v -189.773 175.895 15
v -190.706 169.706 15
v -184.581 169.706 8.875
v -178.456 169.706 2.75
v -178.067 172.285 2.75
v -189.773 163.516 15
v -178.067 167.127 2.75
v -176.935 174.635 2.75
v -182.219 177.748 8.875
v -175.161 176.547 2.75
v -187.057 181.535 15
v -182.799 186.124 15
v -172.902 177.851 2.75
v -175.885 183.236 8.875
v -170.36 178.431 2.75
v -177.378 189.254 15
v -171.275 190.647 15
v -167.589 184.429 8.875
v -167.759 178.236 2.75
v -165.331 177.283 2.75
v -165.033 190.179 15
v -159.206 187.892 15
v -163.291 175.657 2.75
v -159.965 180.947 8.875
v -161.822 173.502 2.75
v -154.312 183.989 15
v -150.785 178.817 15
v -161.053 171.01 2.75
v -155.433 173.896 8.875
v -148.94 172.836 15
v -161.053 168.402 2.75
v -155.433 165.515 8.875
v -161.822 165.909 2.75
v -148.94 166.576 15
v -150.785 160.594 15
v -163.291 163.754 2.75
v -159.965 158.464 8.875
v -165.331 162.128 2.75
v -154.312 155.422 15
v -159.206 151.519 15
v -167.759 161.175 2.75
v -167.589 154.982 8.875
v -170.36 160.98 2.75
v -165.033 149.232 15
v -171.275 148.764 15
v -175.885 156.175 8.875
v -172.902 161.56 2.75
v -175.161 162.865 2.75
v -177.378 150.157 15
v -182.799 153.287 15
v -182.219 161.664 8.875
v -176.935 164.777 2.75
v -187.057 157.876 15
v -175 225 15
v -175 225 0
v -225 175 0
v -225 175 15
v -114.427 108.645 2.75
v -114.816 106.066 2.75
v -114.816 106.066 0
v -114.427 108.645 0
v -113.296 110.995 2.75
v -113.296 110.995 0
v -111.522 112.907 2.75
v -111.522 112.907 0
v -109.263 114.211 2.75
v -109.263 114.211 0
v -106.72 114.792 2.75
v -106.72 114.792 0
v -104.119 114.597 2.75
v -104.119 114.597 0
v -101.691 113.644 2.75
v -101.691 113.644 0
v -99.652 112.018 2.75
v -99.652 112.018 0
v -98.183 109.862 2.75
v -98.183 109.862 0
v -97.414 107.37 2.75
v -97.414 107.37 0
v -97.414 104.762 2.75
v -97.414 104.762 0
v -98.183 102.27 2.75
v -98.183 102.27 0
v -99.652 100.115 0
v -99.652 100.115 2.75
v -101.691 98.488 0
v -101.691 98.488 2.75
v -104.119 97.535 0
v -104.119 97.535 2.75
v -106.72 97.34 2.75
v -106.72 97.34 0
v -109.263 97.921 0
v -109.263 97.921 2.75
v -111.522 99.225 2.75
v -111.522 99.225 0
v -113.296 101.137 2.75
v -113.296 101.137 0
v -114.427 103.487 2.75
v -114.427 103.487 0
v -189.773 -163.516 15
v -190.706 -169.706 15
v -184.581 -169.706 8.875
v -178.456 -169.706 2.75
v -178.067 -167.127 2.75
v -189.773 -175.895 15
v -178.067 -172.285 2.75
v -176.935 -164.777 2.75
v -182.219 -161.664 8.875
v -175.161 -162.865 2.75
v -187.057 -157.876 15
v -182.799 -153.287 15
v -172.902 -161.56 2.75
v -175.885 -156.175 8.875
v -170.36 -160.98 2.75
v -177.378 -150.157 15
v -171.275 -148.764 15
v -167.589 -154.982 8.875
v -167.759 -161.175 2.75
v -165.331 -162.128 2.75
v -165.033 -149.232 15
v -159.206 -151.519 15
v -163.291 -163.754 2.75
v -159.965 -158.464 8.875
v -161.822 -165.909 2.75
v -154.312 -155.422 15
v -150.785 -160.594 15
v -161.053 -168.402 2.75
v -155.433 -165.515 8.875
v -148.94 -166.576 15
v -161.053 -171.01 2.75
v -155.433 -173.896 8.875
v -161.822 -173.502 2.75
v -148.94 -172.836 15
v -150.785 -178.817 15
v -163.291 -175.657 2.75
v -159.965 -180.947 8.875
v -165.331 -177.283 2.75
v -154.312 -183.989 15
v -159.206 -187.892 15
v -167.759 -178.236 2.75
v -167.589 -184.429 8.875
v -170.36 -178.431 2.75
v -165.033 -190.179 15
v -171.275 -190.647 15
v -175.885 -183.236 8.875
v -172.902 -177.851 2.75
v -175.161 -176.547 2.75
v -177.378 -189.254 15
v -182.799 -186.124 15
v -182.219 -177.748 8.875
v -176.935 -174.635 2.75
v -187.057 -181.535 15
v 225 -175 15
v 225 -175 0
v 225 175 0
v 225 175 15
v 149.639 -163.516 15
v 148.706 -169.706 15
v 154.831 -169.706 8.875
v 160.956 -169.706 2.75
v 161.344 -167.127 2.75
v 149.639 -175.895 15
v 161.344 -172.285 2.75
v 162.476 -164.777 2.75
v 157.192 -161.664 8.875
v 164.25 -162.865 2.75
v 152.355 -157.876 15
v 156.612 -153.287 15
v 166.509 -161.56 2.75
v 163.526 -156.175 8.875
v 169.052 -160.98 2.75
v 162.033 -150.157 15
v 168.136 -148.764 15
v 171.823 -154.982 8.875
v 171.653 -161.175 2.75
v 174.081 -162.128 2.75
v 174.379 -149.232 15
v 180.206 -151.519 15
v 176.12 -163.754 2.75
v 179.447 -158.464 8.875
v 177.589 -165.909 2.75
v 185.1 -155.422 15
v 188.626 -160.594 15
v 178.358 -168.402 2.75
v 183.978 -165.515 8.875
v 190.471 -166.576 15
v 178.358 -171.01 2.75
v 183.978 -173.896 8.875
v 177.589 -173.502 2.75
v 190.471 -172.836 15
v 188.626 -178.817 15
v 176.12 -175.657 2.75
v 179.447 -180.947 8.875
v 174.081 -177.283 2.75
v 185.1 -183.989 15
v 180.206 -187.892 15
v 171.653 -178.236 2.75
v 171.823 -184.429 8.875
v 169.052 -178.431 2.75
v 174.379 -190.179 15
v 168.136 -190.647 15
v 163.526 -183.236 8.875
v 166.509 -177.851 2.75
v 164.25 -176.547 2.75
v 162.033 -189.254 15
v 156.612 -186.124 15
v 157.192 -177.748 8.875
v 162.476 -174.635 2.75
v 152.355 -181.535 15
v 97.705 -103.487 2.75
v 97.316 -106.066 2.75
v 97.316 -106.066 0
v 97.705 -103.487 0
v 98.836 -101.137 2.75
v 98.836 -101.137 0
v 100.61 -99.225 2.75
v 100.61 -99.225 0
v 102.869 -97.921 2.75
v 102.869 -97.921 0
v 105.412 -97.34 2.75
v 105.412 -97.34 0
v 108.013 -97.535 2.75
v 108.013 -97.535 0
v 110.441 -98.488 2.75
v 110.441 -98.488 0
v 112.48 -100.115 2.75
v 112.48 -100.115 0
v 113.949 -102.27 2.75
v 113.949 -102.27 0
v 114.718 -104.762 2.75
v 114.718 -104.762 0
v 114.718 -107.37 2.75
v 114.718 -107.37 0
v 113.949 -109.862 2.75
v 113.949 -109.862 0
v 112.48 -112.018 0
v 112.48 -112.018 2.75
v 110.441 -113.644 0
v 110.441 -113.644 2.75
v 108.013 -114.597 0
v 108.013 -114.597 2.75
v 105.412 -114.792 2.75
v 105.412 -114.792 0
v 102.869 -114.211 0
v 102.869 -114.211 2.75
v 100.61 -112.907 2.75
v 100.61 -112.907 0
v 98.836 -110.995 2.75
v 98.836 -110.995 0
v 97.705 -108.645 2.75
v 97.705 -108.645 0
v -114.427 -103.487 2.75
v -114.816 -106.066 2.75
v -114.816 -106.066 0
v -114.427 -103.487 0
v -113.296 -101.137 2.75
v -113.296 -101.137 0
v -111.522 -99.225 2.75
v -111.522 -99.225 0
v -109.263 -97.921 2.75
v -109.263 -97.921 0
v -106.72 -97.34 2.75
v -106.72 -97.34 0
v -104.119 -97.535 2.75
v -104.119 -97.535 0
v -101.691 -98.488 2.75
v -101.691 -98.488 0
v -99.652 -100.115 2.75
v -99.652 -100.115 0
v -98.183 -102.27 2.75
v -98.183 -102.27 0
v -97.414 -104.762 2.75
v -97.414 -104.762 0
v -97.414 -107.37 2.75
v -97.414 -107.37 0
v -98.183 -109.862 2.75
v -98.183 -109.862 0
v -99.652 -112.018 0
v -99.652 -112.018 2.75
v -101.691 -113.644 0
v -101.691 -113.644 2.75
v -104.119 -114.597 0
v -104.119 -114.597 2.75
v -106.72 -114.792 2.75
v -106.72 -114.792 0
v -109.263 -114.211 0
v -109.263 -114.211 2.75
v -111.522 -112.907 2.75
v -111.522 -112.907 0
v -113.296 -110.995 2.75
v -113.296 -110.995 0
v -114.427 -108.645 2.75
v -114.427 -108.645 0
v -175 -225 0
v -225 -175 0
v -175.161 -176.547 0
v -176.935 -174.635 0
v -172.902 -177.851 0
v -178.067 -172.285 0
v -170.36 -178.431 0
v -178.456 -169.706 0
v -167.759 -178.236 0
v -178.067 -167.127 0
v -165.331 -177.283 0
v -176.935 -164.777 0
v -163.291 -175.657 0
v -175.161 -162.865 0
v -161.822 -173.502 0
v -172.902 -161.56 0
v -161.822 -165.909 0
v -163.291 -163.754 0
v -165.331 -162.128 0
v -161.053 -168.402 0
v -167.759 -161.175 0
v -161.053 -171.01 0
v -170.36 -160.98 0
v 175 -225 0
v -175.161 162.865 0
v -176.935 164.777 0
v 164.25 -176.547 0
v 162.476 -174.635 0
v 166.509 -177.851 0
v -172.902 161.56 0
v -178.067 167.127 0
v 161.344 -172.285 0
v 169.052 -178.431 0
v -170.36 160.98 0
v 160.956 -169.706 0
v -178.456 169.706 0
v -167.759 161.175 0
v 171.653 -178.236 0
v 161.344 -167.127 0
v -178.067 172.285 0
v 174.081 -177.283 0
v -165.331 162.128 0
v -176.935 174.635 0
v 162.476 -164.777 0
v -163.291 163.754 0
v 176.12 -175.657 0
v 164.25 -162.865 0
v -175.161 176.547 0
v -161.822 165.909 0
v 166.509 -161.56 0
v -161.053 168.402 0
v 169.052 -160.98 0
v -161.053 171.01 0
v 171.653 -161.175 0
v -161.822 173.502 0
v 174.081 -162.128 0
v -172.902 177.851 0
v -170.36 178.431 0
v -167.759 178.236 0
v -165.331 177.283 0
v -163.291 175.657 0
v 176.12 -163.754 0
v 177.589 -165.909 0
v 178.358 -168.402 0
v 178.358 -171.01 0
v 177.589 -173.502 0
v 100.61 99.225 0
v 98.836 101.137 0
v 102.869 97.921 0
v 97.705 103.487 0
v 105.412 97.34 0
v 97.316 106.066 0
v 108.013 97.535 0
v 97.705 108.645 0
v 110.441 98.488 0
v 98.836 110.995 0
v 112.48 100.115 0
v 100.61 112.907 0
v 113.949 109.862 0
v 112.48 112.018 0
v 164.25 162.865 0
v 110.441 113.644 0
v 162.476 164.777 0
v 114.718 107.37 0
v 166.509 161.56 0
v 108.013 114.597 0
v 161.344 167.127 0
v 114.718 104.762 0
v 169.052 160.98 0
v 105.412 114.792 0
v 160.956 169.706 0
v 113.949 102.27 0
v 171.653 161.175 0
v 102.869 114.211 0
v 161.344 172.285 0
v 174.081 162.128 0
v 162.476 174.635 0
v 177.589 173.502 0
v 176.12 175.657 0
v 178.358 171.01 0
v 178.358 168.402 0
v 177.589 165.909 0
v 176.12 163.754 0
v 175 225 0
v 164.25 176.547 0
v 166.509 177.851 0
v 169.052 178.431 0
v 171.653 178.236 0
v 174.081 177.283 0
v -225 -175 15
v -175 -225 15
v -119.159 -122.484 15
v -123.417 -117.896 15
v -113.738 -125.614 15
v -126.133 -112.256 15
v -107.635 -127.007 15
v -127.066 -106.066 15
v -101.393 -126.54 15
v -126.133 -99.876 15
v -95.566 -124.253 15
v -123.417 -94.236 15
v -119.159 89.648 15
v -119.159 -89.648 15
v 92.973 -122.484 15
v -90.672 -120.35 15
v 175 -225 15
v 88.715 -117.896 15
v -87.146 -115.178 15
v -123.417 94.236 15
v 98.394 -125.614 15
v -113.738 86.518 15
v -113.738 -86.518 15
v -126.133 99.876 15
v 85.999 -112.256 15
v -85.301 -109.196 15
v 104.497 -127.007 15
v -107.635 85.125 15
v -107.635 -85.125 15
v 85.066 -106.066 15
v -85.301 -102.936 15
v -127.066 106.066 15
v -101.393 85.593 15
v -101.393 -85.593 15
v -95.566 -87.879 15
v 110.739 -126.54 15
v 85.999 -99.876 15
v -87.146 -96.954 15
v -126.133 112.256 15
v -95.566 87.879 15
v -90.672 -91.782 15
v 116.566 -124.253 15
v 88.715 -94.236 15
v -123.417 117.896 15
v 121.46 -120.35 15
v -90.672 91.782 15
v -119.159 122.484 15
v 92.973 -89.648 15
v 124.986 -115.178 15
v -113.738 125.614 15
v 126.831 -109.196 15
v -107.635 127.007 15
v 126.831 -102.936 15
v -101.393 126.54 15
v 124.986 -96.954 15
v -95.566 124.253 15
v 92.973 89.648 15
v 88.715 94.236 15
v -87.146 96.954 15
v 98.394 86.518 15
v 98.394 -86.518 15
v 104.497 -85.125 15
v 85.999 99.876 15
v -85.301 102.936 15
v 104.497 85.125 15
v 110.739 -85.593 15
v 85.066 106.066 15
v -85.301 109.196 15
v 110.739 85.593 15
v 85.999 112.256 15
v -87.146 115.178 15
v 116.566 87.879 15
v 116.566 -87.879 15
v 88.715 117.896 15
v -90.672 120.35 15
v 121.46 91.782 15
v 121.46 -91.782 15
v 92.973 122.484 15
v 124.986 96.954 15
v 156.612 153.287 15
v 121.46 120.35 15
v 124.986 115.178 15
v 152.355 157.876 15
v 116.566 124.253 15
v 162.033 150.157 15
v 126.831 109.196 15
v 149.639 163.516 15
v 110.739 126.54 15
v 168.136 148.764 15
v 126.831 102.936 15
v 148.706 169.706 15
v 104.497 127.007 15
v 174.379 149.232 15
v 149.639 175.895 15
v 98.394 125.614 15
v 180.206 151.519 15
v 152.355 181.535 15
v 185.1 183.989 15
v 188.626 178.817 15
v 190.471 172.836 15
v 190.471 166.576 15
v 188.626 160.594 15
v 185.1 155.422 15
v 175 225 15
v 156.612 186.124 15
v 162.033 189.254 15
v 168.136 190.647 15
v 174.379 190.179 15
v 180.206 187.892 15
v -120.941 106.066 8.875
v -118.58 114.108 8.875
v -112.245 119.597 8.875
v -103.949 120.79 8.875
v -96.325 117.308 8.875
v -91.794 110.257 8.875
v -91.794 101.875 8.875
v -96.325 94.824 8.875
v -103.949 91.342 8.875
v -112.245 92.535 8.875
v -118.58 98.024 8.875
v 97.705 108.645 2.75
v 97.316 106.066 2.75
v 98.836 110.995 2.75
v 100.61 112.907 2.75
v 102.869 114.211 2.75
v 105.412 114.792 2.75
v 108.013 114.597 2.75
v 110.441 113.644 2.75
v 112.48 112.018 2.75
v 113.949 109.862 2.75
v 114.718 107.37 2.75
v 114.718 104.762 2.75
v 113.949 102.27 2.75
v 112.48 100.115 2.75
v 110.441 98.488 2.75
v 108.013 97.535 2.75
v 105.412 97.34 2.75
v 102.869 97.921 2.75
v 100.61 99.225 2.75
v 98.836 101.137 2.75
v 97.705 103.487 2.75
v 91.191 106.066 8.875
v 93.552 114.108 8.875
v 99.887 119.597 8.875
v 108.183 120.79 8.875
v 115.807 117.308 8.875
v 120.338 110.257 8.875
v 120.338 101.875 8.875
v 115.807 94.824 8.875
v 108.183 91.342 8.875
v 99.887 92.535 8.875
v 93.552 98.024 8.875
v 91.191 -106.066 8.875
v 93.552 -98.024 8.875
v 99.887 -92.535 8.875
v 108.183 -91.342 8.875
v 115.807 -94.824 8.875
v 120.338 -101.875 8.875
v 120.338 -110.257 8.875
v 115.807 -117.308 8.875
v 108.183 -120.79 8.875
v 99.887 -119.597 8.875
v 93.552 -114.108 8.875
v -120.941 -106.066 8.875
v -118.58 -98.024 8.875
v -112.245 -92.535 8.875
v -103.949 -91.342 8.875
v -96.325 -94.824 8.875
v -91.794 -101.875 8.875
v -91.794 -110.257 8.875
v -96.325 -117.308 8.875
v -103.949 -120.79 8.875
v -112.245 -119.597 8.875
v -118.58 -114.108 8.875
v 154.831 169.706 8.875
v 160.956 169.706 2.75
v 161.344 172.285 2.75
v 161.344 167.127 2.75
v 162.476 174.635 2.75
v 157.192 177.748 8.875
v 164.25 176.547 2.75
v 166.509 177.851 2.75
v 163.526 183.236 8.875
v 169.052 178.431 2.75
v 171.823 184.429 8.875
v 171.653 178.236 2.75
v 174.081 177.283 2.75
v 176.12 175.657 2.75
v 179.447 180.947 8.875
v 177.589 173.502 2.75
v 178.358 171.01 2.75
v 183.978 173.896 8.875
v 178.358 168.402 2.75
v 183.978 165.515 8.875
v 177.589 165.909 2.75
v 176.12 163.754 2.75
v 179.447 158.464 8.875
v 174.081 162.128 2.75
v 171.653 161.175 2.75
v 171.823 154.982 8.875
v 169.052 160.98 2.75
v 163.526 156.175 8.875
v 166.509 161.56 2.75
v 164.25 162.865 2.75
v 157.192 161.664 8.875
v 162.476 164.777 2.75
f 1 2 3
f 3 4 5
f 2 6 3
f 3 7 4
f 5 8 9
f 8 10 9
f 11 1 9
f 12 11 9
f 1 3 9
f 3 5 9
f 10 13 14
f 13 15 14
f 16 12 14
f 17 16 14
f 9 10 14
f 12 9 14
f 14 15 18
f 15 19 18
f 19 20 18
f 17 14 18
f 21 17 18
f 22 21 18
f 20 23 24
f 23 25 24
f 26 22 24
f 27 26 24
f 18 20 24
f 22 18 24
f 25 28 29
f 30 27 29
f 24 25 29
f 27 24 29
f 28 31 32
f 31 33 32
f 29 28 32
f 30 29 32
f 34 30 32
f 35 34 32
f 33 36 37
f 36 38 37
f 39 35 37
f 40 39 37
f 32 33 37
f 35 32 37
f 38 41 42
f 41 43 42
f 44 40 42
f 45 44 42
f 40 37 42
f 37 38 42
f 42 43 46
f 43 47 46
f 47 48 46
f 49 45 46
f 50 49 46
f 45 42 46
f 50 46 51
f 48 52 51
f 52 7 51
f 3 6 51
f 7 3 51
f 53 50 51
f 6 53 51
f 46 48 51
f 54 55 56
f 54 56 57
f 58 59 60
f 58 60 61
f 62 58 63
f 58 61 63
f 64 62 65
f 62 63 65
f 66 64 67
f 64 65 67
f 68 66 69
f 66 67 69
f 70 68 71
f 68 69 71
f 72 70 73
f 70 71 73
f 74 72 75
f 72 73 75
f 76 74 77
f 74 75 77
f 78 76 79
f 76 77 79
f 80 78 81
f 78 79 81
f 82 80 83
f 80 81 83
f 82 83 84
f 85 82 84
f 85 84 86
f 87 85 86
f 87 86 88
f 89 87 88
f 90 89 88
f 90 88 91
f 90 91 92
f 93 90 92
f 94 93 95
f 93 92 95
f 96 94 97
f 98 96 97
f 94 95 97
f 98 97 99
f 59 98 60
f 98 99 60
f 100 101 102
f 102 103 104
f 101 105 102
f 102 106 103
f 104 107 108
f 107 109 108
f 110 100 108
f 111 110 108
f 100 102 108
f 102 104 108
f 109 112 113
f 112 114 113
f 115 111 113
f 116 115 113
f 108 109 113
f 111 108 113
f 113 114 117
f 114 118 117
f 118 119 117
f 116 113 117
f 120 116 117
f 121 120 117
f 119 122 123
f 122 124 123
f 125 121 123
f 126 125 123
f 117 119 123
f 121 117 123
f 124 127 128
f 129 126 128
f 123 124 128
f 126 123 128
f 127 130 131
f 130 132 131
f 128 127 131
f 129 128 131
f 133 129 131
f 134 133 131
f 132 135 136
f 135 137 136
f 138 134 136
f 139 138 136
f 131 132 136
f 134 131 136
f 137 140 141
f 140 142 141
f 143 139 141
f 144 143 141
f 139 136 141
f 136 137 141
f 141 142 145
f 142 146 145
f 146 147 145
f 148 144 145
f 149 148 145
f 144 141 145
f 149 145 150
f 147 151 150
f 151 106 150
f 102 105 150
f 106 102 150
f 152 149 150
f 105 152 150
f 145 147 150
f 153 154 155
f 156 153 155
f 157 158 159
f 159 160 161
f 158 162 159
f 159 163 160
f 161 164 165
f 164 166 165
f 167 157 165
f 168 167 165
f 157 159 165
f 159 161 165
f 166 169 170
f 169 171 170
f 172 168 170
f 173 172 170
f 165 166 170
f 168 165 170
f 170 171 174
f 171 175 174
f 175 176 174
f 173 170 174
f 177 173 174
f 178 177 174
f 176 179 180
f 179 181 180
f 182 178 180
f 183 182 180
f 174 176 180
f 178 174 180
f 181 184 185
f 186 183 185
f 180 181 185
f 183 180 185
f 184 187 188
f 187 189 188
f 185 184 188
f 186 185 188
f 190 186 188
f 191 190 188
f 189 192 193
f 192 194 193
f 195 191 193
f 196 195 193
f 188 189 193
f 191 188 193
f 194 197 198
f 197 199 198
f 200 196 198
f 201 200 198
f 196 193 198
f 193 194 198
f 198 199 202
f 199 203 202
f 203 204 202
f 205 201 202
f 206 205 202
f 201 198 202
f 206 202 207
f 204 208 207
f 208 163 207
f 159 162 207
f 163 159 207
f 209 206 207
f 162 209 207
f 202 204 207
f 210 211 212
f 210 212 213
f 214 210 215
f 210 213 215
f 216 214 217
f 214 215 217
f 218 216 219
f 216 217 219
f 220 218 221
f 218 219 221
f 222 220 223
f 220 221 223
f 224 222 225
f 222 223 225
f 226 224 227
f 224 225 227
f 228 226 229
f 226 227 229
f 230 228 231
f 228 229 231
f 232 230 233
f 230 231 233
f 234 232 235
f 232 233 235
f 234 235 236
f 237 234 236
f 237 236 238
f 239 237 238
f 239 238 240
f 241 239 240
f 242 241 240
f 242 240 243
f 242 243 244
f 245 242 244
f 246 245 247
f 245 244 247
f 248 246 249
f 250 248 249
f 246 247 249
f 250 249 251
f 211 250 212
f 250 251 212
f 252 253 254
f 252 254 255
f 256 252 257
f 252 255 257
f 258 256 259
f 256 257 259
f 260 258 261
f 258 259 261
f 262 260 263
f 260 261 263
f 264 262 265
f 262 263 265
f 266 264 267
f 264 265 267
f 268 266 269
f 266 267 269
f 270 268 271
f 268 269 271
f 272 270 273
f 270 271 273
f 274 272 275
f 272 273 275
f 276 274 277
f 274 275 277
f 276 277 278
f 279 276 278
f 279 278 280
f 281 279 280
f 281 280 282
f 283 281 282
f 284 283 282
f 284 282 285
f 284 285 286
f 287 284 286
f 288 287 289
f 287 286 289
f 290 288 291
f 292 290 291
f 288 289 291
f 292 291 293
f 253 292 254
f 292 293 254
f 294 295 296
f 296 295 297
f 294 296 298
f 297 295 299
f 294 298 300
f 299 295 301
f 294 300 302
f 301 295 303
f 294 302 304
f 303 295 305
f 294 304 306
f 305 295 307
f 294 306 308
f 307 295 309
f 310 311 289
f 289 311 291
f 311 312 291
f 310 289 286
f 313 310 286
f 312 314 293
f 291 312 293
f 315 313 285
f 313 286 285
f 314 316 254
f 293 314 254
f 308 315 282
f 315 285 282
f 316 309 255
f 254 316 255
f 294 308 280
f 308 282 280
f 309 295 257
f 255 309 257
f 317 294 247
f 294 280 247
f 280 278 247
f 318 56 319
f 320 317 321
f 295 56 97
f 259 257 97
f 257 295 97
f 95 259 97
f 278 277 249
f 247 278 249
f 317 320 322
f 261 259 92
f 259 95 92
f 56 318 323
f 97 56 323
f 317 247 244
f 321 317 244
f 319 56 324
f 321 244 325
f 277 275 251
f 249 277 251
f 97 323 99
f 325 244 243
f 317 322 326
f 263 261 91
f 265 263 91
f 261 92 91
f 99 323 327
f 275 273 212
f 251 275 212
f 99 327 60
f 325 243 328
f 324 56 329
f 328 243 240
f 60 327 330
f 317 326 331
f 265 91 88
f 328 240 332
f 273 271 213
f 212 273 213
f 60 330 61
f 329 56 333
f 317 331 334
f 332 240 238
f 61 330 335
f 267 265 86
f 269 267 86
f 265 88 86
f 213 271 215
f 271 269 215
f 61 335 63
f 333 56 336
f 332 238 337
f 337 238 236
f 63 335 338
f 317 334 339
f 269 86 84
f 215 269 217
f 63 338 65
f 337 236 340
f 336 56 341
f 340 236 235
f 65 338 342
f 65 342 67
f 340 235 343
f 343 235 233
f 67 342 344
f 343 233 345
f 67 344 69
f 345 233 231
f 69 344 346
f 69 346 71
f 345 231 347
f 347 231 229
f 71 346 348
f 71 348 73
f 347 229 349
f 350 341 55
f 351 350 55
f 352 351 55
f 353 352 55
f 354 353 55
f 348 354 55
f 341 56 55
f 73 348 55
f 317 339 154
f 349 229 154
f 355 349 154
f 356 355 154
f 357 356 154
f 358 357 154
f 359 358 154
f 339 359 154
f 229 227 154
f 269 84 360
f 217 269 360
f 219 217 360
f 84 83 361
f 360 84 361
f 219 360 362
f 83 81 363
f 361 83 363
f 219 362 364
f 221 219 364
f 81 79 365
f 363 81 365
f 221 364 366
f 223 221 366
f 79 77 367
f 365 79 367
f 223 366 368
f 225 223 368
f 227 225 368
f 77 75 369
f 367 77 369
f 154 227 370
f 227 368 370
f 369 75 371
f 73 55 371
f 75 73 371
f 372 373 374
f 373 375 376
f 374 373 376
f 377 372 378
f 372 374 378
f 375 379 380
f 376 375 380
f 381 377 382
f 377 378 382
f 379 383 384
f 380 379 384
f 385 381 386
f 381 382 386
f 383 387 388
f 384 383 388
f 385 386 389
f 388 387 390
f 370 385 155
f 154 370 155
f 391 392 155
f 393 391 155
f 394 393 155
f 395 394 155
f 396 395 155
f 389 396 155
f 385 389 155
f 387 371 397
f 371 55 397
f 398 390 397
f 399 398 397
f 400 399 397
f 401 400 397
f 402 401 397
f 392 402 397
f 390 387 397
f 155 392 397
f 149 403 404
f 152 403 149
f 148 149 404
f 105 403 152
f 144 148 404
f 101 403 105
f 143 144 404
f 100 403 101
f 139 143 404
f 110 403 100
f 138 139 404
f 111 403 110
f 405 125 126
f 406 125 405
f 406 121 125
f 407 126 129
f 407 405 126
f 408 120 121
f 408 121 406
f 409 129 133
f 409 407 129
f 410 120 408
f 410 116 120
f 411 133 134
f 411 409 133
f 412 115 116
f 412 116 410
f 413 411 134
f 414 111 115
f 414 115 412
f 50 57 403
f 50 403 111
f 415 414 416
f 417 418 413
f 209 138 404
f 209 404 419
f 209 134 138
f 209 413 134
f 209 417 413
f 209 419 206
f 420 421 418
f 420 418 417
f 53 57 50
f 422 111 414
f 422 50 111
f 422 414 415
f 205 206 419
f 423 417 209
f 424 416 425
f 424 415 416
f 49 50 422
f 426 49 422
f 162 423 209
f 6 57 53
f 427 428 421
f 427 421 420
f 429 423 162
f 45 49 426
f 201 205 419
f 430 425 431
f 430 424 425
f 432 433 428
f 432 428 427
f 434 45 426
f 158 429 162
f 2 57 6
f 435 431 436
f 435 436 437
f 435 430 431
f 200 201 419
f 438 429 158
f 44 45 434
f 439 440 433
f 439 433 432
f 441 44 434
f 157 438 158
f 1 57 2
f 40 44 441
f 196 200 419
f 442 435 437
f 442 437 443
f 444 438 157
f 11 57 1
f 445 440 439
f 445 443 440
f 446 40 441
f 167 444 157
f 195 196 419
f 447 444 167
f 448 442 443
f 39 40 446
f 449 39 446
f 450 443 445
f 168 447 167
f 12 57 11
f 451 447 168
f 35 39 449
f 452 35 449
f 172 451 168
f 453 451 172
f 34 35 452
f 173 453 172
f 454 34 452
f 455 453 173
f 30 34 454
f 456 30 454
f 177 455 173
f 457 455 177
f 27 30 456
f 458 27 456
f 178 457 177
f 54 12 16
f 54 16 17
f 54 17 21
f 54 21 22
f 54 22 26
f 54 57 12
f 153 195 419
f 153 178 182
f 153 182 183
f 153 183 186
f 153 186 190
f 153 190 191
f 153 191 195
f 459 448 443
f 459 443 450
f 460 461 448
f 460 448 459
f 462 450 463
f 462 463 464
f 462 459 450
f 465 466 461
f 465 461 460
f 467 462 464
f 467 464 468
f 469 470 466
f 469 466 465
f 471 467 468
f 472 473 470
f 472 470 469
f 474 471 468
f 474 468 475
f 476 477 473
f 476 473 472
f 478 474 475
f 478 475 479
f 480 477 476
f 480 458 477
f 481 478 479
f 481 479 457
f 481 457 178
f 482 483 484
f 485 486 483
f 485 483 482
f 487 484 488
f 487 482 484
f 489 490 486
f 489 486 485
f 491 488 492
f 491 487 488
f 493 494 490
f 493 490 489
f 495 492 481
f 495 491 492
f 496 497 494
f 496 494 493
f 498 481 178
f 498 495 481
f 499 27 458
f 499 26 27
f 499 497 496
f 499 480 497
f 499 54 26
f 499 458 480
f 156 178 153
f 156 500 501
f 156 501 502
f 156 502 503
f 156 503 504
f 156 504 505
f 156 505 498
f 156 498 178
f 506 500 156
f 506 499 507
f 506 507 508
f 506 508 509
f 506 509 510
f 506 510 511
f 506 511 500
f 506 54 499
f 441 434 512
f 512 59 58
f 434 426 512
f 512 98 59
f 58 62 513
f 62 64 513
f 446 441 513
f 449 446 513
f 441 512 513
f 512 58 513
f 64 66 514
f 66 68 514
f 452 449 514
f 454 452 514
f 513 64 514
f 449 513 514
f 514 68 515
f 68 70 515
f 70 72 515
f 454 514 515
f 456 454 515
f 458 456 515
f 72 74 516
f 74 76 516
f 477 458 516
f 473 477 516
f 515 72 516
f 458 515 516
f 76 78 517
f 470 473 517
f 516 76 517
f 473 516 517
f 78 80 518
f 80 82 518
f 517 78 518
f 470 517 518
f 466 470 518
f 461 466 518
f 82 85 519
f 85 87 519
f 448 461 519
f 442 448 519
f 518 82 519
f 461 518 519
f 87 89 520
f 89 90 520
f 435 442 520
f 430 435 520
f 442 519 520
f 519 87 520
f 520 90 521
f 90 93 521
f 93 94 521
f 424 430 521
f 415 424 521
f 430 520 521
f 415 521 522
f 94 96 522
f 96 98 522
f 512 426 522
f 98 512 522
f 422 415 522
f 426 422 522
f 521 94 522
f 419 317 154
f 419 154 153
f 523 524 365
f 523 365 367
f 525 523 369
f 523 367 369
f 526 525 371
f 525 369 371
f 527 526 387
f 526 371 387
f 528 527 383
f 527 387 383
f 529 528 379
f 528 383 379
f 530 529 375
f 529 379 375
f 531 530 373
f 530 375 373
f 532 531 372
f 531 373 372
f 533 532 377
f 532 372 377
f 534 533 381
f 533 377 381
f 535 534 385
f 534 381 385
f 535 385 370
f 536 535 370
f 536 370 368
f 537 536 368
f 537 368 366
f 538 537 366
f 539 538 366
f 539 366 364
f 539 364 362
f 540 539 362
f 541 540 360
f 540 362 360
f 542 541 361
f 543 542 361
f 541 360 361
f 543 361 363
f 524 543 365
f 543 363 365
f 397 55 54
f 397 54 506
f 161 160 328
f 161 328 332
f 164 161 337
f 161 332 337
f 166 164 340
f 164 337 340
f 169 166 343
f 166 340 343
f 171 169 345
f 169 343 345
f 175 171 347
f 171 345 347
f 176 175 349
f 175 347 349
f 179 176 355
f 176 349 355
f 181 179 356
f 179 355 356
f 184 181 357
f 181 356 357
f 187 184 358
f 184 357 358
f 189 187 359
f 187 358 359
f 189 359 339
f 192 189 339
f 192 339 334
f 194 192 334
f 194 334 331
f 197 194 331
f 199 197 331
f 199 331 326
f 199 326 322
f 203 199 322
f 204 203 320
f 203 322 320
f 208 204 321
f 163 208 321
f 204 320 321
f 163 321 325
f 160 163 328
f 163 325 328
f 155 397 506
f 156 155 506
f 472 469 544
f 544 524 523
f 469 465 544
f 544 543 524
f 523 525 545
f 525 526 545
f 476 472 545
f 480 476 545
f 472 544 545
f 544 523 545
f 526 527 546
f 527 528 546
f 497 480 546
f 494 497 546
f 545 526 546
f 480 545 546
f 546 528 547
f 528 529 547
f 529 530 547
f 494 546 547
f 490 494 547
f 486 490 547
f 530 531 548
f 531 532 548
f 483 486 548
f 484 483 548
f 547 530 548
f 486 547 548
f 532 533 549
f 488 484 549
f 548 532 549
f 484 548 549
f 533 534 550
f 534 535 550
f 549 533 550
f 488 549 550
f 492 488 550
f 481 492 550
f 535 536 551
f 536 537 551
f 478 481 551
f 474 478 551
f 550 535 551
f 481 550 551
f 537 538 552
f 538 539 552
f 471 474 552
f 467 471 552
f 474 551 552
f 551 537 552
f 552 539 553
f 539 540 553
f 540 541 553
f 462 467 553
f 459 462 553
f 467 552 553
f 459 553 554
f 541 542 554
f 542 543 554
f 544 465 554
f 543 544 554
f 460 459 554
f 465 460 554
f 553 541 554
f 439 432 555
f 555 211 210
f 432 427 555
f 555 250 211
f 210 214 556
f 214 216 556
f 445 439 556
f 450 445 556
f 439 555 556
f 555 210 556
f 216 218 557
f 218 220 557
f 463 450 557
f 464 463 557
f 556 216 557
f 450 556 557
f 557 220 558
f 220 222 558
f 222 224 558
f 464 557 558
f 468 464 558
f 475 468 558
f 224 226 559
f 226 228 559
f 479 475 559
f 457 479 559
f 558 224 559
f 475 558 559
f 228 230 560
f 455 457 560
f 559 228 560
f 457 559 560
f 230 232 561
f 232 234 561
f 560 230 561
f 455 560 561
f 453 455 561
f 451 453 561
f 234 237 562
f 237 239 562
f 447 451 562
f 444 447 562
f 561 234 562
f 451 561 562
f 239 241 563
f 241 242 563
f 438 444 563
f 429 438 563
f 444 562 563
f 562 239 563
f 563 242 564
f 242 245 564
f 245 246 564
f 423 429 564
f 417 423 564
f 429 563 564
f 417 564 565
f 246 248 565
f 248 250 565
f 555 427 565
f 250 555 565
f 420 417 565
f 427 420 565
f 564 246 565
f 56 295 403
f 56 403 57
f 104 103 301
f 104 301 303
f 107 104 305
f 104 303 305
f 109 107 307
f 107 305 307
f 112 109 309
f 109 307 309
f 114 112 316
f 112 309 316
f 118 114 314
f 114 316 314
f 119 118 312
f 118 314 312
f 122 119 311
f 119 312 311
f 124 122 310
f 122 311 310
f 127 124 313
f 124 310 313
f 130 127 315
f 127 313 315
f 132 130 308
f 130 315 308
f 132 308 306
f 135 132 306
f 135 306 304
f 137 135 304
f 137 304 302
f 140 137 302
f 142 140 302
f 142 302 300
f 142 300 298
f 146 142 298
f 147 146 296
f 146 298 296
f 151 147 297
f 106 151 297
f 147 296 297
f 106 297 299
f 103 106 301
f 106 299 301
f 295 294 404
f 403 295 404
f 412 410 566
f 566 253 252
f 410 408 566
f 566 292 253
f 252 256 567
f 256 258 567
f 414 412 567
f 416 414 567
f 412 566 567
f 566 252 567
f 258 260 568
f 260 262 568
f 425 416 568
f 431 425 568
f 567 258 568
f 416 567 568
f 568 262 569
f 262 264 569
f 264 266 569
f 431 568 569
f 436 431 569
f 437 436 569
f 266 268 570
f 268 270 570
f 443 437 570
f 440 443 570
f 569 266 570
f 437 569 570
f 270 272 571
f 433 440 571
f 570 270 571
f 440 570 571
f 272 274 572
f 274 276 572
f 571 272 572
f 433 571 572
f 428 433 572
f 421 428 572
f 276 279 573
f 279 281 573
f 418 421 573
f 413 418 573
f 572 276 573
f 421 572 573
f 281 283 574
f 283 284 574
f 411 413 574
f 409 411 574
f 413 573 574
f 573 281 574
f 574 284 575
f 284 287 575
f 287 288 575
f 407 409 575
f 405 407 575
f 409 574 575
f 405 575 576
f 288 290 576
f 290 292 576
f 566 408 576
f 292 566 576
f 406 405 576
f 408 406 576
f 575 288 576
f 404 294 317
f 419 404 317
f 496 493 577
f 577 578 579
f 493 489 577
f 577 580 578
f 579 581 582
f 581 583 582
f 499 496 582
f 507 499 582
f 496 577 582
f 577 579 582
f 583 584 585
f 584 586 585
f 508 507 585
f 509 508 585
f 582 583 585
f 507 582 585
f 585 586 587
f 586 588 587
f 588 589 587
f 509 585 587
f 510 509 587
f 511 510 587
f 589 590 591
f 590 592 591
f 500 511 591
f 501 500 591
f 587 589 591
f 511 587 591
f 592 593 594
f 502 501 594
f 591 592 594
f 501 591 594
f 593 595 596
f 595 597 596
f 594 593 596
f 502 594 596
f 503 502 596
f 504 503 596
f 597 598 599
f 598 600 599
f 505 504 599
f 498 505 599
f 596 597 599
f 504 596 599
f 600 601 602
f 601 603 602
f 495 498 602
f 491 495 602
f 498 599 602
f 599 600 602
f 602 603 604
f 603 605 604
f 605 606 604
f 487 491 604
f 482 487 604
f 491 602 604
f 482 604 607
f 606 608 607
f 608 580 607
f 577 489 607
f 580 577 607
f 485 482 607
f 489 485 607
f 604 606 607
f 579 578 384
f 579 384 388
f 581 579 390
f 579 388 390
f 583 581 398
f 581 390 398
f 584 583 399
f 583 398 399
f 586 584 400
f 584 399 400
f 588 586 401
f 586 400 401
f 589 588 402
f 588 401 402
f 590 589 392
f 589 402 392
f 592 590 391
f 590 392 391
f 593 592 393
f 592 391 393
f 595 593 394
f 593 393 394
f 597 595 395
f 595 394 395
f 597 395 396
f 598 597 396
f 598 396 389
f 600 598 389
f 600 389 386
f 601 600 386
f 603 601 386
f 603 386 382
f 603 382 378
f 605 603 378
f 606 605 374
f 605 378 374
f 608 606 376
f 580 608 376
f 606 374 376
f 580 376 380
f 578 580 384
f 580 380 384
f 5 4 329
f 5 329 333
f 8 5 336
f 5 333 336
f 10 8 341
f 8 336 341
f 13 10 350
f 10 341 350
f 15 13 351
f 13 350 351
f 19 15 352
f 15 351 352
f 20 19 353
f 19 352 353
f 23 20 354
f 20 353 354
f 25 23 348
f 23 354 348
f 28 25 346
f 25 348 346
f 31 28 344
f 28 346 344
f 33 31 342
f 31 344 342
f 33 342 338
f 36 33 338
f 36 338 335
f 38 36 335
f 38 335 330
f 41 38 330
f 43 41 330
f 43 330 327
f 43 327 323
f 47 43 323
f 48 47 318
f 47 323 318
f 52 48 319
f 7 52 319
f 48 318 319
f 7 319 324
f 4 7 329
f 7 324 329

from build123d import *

# Parameters (mm, degrees)
F0_W           = 450
F0_H           = 450
F1_DEPTH       = 15
F3_D           = 17.5
F3_DEPTH       = 57.5
F3_CSINK_D     = 42
F3_CSINK_ANGLE = 90
F3_TIP         = 5.2575304165
F4_SIZE        = 50


with BuildPart() as f1:
    # F0 (on Top) → F1 (new body)
    with BuildSketch(Plane.XY):
        Rectangle(F0_W, F0_H)
    extrude(amount=F1_DEPTH)

    # F3
    with Locations(Plane.XY.offset(15)):
        with Locations((169.7056274848, 169.7056274848), (169.7056274848, -169.7056274848), (-169.7056274848, -169.7056274848), (-169.7056274848, 169.7056274848), (-106.066017178, 106.066017178), (106.066017178, 106.066017178), (106.066017178, -106.066017178), (-106.066017178, -106.066017178)):
            CounterSinkHole(F3_D / 2, F3_CSINK_D / 2, depth=F3_DEPTH, counter_sink_angle=F3_CSINK_ANGLE)
            with Locations((0, 0, -(F3_DEPTH + F3_TIP / 2))):  # 118° drill point
                Cone(0, F3_D / 2, F3_TIP, mode=Mode.SUBTRACT)

    # F4
    f4_edges = [f1.edges().sort_by_distance(p)[0] for p in [
        (225, -225, 7.5),
        (225, 225, 7.5),
        (-225, 225, 7.5),
        (-225, -225, 7.5),
    ]]
    chamfer(f4_edges, length=F4_SIZE)


solid = f1.part
